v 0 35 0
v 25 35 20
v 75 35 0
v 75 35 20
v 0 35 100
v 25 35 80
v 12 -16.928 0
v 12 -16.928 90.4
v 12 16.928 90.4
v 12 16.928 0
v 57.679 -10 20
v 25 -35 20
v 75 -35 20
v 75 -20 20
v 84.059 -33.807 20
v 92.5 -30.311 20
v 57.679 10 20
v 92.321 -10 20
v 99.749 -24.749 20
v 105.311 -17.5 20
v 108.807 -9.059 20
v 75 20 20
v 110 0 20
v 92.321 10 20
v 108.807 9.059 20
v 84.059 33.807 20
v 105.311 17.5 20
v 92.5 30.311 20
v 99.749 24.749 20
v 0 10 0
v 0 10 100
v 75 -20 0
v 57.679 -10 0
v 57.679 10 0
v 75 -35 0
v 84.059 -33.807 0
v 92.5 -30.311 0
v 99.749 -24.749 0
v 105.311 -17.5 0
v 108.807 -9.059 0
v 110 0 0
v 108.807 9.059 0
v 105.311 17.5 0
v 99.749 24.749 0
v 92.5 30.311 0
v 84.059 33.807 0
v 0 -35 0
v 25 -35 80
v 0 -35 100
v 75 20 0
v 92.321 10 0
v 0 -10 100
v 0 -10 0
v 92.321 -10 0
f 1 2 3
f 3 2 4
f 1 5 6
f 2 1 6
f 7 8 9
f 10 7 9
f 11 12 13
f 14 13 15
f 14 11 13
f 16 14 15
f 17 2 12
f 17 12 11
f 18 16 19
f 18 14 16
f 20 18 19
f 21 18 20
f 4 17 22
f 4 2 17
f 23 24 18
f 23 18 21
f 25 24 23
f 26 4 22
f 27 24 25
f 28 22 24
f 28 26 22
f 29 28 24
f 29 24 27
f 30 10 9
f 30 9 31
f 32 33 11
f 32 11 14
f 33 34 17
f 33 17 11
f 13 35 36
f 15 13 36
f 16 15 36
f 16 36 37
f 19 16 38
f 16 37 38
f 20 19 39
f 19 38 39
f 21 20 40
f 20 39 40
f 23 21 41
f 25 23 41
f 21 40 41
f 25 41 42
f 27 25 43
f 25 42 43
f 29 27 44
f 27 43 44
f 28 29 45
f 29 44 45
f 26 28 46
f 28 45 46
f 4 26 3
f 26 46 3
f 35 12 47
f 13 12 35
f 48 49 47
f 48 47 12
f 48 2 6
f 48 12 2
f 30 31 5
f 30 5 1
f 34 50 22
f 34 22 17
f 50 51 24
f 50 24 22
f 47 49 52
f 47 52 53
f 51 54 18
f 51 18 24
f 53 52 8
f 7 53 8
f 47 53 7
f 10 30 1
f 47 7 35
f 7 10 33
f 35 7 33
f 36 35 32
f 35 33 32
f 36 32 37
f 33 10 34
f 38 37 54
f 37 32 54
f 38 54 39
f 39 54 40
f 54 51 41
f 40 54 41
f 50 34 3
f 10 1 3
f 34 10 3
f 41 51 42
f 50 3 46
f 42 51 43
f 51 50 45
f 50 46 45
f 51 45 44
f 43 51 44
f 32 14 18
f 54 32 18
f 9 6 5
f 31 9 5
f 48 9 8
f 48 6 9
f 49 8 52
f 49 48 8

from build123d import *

# Parameters (mm, degrees)
PAD_DEPTH    = 35
PAD001_DEPTH = 20
POCKET_DEPTH = 100.001


with BuildPart() as part:
    # Sketch → Pad (new body, symmetric)
    with BuildSketch(Plane.XZ):
        Polygon((0, 100), (0, 0), (75, 0), (75, 20), (25, 20), (25, 80), align=None)
    extrude(amount=PAD_DEPTH, both=True)

    # Sketch001 → Pad001 (join)
    with BuildSketch(Plane.XY):
        with BuildLine():
            ThreePointArc((75, -35), (110, 0), (75, 35))
            Line((75, 35), (75, -35))
        make_face()
    extrude(amount=PAD001_DEPTH)

    # Sketch002 → Pocket (cut, through all)
    with BuildSketch(Plane.XY):
        Polygon((0, 10), (0, -10), (12, -16.928203), (12, 16.928203), align=None)
        Polygon((57.679492, -10), (75, -20), (92.320508, -10), (92.320508, 10), (75, 20), (57.679492, 10), align=None)
    extrude(amount=POCKET_DEPTH, mode=Mode.SUBTRACT)


solid = part.part
